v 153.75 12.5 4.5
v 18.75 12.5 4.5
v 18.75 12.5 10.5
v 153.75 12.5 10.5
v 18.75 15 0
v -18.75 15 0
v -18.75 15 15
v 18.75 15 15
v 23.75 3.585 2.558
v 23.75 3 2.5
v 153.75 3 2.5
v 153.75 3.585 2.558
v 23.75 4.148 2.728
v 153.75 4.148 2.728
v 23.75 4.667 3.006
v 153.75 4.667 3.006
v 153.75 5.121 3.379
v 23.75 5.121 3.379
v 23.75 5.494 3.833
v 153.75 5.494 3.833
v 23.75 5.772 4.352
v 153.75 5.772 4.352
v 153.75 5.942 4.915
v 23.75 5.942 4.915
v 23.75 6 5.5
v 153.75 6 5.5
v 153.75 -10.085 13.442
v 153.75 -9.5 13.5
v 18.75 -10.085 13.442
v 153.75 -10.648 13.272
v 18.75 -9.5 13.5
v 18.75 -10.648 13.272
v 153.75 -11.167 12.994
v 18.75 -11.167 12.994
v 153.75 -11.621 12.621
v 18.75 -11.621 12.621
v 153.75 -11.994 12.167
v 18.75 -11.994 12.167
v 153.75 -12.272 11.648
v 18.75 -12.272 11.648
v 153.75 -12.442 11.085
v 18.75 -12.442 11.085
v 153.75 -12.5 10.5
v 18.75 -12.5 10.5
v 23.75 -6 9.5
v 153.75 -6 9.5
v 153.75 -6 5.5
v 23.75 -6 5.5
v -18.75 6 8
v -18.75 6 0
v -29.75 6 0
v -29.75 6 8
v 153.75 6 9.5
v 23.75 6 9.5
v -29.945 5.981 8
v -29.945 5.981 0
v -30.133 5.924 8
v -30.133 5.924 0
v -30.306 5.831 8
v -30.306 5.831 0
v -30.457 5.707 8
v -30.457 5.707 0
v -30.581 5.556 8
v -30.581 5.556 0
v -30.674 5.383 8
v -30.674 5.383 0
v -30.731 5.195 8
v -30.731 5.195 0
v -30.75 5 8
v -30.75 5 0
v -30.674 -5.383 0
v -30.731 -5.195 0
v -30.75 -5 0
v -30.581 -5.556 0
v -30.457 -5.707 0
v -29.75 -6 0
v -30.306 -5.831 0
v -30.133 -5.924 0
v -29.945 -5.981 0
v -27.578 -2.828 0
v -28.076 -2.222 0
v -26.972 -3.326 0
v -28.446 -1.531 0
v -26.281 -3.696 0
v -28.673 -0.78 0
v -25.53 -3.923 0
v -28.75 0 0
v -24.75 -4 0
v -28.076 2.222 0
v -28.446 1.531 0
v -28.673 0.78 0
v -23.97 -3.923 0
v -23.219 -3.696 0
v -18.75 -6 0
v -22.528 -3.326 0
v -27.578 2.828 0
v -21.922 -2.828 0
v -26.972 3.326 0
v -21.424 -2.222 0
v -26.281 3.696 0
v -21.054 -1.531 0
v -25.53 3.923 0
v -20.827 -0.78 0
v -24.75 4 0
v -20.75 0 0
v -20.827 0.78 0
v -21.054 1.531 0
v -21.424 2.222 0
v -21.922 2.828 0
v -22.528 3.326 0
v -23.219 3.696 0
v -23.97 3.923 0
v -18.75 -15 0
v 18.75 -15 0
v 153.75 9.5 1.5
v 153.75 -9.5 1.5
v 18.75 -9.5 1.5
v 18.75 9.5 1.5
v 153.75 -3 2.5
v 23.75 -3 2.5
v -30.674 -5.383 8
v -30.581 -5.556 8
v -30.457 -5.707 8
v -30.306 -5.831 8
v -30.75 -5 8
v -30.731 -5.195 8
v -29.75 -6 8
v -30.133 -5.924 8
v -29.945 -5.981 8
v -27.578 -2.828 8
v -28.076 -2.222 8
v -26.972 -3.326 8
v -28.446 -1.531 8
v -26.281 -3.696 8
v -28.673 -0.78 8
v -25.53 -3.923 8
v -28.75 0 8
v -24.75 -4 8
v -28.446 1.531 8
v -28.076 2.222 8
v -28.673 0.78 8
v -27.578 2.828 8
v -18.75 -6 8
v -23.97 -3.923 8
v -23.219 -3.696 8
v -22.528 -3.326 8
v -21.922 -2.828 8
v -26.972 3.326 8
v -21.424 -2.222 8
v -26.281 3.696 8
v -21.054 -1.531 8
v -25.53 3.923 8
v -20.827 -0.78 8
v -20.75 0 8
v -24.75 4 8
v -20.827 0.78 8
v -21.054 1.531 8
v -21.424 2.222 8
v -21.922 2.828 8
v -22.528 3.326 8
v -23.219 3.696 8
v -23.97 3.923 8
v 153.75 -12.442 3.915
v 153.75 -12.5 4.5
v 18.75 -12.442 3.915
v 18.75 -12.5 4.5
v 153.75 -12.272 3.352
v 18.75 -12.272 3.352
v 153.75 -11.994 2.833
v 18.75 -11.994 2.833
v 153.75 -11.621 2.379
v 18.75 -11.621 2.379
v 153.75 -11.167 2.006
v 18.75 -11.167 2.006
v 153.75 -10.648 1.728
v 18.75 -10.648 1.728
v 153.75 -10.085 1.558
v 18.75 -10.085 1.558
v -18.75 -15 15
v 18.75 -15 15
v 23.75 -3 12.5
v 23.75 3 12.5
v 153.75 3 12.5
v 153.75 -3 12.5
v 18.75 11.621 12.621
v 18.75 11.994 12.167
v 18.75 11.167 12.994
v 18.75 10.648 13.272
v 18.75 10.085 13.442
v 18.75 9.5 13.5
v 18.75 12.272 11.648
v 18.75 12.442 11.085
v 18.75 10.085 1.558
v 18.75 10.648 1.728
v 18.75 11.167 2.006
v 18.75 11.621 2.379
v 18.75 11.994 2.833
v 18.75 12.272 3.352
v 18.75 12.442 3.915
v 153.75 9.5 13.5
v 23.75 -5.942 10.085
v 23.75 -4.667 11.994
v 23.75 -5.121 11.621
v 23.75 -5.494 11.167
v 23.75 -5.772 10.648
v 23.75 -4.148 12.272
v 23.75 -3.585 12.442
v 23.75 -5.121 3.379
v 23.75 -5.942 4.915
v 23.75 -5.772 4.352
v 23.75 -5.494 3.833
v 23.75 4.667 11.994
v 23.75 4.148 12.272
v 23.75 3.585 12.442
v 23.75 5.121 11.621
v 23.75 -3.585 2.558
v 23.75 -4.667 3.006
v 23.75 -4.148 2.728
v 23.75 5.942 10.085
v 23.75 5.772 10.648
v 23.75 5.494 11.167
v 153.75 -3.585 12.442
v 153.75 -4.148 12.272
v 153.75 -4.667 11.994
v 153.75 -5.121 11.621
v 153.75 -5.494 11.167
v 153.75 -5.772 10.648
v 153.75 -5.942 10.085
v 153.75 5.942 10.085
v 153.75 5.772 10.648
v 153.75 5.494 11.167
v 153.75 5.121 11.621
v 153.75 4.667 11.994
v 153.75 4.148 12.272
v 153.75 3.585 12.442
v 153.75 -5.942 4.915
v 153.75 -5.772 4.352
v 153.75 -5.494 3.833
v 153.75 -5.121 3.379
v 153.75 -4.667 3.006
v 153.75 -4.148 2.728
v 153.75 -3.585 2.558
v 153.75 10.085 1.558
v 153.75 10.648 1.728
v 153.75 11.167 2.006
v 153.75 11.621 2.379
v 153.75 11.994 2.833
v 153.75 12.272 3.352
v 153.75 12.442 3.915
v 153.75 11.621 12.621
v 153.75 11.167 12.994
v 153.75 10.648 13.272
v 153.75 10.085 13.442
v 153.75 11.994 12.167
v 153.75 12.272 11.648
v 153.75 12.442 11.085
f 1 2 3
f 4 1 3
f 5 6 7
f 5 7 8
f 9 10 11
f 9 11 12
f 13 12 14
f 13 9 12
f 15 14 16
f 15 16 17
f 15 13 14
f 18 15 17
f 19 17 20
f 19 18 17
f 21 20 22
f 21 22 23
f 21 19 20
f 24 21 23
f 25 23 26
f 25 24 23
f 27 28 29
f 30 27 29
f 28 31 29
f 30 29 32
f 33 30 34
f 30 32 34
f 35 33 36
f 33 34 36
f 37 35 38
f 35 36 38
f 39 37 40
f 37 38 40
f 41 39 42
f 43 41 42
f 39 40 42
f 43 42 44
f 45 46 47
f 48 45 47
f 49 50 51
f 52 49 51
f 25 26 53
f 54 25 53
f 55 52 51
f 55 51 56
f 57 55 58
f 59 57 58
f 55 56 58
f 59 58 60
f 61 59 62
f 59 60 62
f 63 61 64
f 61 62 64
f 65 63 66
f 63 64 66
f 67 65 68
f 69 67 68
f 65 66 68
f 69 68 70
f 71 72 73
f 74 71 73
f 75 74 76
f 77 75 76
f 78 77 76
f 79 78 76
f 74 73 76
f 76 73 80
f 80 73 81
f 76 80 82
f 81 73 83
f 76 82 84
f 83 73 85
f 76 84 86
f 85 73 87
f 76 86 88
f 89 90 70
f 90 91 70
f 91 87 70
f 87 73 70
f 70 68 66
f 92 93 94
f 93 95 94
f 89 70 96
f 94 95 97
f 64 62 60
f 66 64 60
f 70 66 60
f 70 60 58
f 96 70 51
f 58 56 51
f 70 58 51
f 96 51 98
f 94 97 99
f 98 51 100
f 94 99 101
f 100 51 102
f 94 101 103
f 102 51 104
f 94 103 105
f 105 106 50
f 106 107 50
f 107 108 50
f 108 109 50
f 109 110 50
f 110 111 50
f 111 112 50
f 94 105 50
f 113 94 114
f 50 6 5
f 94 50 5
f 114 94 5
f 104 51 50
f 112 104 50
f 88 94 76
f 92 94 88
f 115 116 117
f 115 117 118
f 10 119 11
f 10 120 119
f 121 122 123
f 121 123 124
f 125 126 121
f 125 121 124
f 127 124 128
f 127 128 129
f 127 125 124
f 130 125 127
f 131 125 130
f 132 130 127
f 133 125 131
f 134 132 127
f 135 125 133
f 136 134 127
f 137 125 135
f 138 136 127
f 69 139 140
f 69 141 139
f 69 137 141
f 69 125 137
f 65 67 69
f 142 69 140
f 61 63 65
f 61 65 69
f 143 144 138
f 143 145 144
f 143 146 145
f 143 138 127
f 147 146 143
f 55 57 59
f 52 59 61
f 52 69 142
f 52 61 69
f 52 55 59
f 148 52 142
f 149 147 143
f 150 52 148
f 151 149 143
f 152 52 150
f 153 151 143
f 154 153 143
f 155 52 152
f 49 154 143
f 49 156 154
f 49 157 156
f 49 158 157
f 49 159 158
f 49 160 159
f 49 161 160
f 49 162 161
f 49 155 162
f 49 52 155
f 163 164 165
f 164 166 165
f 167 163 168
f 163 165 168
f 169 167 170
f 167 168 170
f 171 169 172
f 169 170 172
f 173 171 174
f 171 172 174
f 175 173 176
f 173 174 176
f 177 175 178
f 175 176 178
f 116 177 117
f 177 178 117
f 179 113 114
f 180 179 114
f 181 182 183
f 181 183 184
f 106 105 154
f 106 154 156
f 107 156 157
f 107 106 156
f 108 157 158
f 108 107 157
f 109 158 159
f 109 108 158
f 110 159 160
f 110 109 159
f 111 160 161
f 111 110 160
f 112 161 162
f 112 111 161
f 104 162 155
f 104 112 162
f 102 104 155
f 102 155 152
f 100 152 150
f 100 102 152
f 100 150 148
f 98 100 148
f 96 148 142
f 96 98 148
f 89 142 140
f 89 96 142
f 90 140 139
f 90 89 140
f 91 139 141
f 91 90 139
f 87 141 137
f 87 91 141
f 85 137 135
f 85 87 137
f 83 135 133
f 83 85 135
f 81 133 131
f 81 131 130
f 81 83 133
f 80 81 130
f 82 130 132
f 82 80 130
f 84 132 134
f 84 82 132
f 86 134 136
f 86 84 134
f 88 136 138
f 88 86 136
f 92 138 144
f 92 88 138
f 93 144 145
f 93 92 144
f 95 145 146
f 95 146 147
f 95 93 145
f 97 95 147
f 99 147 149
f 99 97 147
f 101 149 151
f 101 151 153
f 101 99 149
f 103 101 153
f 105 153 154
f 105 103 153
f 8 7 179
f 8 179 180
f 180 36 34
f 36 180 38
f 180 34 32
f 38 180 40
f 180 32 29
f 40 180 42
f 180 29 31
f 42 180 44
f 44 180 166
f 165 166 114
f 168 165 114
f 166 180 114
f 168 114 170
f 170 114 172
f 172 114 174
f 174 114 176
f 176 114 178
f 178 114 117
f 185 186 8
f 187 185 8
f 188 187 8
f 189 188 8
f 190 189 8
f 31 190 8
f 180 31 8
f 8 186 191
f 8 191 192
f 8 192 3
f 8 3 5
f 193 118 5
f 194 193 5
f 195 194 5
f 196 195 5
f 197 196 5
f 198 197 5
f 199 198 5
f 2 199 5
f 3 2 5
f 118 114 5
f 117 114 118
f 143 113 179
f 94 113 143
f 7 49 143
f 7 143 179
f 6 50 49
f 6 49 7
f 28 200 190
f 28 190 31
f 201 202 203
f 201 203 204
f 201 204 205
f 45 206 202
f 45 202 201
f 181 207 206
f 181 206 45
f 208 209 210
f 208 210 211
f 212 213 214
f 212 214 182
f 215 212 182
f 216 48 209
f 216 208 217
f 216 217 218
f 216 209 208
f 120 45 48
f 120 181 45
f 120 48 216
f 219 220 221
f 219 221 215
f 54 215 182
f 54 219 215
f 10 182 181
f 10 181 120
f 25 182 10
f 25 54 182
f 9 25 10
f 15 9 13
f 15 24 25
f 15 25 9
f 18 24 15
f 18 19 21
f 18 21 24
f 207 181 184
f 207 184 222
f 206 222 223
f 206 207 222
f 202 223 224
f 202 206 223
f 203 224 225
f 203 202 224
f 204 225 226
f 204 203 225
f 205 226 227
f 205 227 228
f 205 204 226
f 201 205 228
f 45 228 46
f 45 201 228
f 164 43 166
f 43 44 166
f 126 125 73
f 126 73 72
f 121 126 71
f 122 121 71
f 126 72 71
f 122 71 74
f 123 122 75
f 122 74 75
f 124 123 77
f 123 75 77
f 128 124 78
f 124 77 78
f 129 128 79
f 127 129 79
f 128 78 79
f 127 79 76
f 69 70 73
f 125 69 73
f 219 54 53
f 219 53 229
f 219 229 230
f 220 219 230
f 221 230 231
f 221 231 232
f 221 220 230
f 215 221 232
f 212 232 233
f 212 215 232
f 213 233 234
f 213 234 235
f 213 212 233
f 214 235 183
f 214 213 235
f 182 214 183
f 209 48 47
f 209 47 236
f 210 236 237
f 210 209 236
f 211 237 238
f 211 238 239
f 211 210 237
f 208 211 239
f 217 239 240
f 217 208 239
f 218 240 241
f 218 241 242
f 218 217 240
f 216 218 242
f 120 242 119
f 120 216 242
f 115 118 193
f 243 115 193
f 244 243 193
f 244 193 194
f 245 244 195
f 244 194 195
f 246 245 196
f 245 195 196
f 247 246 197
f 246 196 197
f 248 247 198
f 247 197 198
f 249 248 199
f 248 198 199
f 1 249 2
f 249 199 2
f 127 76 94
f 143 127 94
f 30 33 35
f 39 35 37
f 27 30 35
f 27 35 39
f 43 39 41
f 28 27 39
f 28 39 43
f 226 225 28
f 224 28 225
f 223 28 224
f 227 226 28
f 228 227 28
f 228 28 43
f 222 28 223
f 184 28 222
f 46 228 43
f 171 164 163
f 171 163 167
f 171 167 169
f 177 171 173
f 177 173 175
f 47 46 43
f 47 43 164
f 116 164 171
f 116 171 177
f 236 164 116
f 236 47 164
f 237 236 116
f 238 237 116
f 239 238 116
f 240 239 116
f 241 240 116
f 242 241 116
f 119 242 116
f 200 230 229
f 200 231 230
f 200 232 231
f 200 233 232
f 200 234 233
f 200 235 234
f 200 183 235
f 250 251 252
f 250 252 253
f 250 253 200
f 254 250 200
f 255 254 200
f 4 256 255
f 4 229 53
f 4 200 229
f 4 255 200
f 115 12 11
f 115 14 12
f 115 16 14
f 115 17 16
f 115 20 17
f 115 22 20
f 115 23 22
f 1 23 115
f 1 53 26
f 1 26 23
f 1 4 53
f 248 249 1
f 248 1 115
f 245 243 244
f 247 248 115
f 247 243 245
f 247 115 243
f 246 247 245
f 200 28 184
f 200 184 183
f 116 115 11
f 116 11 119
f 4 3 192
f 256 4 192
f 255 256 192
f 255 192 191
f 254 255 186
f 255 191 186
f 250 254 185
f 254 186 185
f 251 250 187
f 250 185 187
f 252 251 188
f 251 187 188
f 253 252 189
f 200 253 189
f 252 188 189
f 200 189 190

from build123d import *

# Parameters (mm, degrees)
CROQUIS1_W              = 37.5
CROQUIS1_H              = 30
SALIENTE_EXTRUIR1_DEPTH = 15
CROQUIS2_R              = 4
SALIENTE_EXTRUIR2_DEPTH = 8
SALIENTE_EXTRUIR3_DEPTH = 35
CROQUIS5_W              = 18
CROQUIS5_H              = 12
CROQUIS5_R              = 4.5
SALIENTE_EXTRUIR4_DEPTH = 5
CROQUIS6_W              = 1
CROQUIS6_H              = 12
CORTAR_EXTRUIR2_DEPTH   = 14
CROQUIS7_W              = 58.738074731
CROQUIS7_H              = 36.211204921
CORTAR_EXTRUIR4_DEPTH   = 75.820201149
CORTAR_EXTRUIR5_DEPTH   = 30
SALIENTE_EXTRUIR5_DEPTH = 100


with BuildPart() as part:
    # Croquis1 → Saliente-Extruir1 (new body)
    with BuildSketch(Plane.XY):
        Rectangle(CROQUIS1_W, CROQUIS1_H)
    extrude(amount=SALIENTE_EXTRUIR1_DEPTH)

    # Croquis2 → Saliente-Extruir2 (add)
    with BuildSketch(Plane.XY):
        with BuildLine():
            Line((-18.75, 6), (-29.75, 6))
            ThreePointArc((-29.75, 6), (-30.457106781, 5.707106781), (-30.75, 5))
            Line((-30.75, 5), (-30.75, -5))
            ThreePointArc((-30.75, -5), (-30.457106781, -5.707106781), (-29.75, -6))
            Line((-29.75, -6), (-18.75, -6))
            Line((-18.75, -6), (-18.75, 6))
        make_face()
        with Locations((-24.75, 0)):
            Circle(CROQUIS2_R, mode=Mode.SUBTRACT)
    extrude(amount=SALIENTE_EXTRUIR2_DEPTH)

    # Croquis3 → Saliente-Extruir3 (add)
    with BuildSketch(Plane(origin=(18.75, 0, 0), x_dir=(0, 0, -1), z_dir=(1, 0, 0))):
        with BuildLine():
            Line((-10.5, -12.5), (-4.5, -12.5))
            ThreePointArc((-4.5, -12.5), (-2.378679656, -11.621320344), (-1.5, -9.5))
            Line((-1.5, -9.5), (-1.5, 9.5))
            ThreePointArc((-1.5, 9.5), (-2.378679656, 11.621320344), (-4.5, 12.5))
            Line((-4.5, 12.5), (-10.5, 12.5))
            ThreePointArc((-10.5, 12.5), (-12.621320344, 11.621320344), (-13.5, 9.5))
            Line((-13.5, 9.5), (-13.5, -9.5))
            ThreePointArc((-13.5, -9.5), (-12.621320344, -11.621320344), (-10.5, -12.5))
        make_face()
    extrude(amount=SALIENTE_EXTRUIR3_DEPTH)

    # Croquis5 → Saliente-Extruir4 (add, symmetric)
    with BuildSketch(Plane.XY.offset(7.5)):
        with Locations((62.75, 0)):
            Rectangle(CROQUIS5_W, CROQUIS5_H)
        with Locations((62.75, 0)):
            Circle(CROQUIS5_R, mode=Mode.SUBTRACT)
    extrude(amount=SALIENTE_EXTRUIR4_DEPTH, both=True)

    # Croquis6 → Cortar-Extruir2 (cut)
    with BuildSketch(Plane(origin=(71.75, 0, 0), x_dir=(0, 0, -1), z_dir=(1, 0, 0))):
        with Locations((-12, 0)):
            Rectangle(CROQUIS6_W, CROQUIS6_H)
        with Locations((-3, 0)):
            Rectangle(CROQUIS6_W, CROQUIS6_H)
    extrude(amount=-CORTAR_EXTRUIR2_DEPTH, mode=Mode.SUBTRACT)

    # Croquis7 → Cortar-Extruir4 (cut, through all)
    with BuildSketch(Plane.XY.offset(15)):
        with Locations((83.119037366, -6.200481031)):
            Rectangle(CROQUIS7_W, CROQUIS7_H)
    extrude(amount=-CORTAR_EXTRUIR4_DEPTH, mode=Mode.SUBTRACT)

    # Croquis8 → Cortar-Extruir5 (cut)
    with BuildSketch(Plane(origin=(53.75, 0, 0), x_dir=(0, 0, -1), z_dir=(1, 0, 0))):
        with BuildLine():
            Line((-9.5, -6), (-5.5, -6))
            ThreePointArc((-5.5, -6), (-3.378679656, -5.121320344), (-2.5, -3))
            Line((-2.5, -3), (-2.5, 3))
            ThreePointArc((-2.5, 3), (-3.378679656, 5.121320344), (-5.5, 6))
            Line((-5.5, 6), (-9.5, 6))
            ThreePointArc((-9.5, 6), (-11.621320344, 5.121320344), (-12.5, 3))
            Line((-12.5, 3), (-12.5, -3))
            ThreePointArc((-12.5, -3), (-11.621320344, -5.121320344), (-9.5, -6))
        make_face()
    extrude(amount=-CORTAR_EXTRUIR5_DEPTH, mode=Mode.SUBTRACT)

    # Croquis10 → Saliente-Extruir5 (add)
    with BuildSketch(Plane(origin=(53.75, 0, 0), x_dir=(0, 0, -1), z_dir=(1, 0, 0))):
        with BuildLine():
            Line((-13.5, 9.5), (-13.5, -9.5))
            ThreePointArc((-13.5, -9.5), (-12.621320344, -11.621320344), (-10.5, -12.5))
            Line((-10.5, -12.5), (-4.5, -12.5))
            ThreePointArc((-4.5, -12.5), (-2.378679656, -11.621320344), (-1.5, -9.5))
            Line((-1.5, -9.5), (-1.5, 9.5))
            ThreePointArc((-1.5, 9.5), (-2.378679656, 11.621320344), (-4.5, 12.5))
            Line((-4.5, 12.5), (-10.5, 12.5))
            ThreePointArc((-10.5, 12.5), (-12.621320344, 11.621320344), (-13.5, 9.5))
        make_face()
        with BuildLine():
            Line((-2.5, -3), (-2.5, 3))
            ThreePointArc((-2.5, 3), (-3.378679656, 5.121320344), (-5.5, 6))
            Line((-5.5, 6), (-9.5, 6))
            ThreePointArc((-9.5, 6), (-11.621320344, 5.121320344), (-12.5, 3))
            Line((-12.5, 3), (-12.5, -3))
            ThreePointArc((-12.5, -3), (-11.621320344, -5.121320344), (-9.5, -6))
            Line((-9.5, -6), (-5.5, -6))
            ThreePointArc((-5.5, -6), (-3.378679656, -5.121320344), (-2.5, -3))
        make_face(mode=Mode.SUBTRACT)
    extrude(amount=SALIENTE_EXTRUIR5_DEPTH)


solid = part.part
